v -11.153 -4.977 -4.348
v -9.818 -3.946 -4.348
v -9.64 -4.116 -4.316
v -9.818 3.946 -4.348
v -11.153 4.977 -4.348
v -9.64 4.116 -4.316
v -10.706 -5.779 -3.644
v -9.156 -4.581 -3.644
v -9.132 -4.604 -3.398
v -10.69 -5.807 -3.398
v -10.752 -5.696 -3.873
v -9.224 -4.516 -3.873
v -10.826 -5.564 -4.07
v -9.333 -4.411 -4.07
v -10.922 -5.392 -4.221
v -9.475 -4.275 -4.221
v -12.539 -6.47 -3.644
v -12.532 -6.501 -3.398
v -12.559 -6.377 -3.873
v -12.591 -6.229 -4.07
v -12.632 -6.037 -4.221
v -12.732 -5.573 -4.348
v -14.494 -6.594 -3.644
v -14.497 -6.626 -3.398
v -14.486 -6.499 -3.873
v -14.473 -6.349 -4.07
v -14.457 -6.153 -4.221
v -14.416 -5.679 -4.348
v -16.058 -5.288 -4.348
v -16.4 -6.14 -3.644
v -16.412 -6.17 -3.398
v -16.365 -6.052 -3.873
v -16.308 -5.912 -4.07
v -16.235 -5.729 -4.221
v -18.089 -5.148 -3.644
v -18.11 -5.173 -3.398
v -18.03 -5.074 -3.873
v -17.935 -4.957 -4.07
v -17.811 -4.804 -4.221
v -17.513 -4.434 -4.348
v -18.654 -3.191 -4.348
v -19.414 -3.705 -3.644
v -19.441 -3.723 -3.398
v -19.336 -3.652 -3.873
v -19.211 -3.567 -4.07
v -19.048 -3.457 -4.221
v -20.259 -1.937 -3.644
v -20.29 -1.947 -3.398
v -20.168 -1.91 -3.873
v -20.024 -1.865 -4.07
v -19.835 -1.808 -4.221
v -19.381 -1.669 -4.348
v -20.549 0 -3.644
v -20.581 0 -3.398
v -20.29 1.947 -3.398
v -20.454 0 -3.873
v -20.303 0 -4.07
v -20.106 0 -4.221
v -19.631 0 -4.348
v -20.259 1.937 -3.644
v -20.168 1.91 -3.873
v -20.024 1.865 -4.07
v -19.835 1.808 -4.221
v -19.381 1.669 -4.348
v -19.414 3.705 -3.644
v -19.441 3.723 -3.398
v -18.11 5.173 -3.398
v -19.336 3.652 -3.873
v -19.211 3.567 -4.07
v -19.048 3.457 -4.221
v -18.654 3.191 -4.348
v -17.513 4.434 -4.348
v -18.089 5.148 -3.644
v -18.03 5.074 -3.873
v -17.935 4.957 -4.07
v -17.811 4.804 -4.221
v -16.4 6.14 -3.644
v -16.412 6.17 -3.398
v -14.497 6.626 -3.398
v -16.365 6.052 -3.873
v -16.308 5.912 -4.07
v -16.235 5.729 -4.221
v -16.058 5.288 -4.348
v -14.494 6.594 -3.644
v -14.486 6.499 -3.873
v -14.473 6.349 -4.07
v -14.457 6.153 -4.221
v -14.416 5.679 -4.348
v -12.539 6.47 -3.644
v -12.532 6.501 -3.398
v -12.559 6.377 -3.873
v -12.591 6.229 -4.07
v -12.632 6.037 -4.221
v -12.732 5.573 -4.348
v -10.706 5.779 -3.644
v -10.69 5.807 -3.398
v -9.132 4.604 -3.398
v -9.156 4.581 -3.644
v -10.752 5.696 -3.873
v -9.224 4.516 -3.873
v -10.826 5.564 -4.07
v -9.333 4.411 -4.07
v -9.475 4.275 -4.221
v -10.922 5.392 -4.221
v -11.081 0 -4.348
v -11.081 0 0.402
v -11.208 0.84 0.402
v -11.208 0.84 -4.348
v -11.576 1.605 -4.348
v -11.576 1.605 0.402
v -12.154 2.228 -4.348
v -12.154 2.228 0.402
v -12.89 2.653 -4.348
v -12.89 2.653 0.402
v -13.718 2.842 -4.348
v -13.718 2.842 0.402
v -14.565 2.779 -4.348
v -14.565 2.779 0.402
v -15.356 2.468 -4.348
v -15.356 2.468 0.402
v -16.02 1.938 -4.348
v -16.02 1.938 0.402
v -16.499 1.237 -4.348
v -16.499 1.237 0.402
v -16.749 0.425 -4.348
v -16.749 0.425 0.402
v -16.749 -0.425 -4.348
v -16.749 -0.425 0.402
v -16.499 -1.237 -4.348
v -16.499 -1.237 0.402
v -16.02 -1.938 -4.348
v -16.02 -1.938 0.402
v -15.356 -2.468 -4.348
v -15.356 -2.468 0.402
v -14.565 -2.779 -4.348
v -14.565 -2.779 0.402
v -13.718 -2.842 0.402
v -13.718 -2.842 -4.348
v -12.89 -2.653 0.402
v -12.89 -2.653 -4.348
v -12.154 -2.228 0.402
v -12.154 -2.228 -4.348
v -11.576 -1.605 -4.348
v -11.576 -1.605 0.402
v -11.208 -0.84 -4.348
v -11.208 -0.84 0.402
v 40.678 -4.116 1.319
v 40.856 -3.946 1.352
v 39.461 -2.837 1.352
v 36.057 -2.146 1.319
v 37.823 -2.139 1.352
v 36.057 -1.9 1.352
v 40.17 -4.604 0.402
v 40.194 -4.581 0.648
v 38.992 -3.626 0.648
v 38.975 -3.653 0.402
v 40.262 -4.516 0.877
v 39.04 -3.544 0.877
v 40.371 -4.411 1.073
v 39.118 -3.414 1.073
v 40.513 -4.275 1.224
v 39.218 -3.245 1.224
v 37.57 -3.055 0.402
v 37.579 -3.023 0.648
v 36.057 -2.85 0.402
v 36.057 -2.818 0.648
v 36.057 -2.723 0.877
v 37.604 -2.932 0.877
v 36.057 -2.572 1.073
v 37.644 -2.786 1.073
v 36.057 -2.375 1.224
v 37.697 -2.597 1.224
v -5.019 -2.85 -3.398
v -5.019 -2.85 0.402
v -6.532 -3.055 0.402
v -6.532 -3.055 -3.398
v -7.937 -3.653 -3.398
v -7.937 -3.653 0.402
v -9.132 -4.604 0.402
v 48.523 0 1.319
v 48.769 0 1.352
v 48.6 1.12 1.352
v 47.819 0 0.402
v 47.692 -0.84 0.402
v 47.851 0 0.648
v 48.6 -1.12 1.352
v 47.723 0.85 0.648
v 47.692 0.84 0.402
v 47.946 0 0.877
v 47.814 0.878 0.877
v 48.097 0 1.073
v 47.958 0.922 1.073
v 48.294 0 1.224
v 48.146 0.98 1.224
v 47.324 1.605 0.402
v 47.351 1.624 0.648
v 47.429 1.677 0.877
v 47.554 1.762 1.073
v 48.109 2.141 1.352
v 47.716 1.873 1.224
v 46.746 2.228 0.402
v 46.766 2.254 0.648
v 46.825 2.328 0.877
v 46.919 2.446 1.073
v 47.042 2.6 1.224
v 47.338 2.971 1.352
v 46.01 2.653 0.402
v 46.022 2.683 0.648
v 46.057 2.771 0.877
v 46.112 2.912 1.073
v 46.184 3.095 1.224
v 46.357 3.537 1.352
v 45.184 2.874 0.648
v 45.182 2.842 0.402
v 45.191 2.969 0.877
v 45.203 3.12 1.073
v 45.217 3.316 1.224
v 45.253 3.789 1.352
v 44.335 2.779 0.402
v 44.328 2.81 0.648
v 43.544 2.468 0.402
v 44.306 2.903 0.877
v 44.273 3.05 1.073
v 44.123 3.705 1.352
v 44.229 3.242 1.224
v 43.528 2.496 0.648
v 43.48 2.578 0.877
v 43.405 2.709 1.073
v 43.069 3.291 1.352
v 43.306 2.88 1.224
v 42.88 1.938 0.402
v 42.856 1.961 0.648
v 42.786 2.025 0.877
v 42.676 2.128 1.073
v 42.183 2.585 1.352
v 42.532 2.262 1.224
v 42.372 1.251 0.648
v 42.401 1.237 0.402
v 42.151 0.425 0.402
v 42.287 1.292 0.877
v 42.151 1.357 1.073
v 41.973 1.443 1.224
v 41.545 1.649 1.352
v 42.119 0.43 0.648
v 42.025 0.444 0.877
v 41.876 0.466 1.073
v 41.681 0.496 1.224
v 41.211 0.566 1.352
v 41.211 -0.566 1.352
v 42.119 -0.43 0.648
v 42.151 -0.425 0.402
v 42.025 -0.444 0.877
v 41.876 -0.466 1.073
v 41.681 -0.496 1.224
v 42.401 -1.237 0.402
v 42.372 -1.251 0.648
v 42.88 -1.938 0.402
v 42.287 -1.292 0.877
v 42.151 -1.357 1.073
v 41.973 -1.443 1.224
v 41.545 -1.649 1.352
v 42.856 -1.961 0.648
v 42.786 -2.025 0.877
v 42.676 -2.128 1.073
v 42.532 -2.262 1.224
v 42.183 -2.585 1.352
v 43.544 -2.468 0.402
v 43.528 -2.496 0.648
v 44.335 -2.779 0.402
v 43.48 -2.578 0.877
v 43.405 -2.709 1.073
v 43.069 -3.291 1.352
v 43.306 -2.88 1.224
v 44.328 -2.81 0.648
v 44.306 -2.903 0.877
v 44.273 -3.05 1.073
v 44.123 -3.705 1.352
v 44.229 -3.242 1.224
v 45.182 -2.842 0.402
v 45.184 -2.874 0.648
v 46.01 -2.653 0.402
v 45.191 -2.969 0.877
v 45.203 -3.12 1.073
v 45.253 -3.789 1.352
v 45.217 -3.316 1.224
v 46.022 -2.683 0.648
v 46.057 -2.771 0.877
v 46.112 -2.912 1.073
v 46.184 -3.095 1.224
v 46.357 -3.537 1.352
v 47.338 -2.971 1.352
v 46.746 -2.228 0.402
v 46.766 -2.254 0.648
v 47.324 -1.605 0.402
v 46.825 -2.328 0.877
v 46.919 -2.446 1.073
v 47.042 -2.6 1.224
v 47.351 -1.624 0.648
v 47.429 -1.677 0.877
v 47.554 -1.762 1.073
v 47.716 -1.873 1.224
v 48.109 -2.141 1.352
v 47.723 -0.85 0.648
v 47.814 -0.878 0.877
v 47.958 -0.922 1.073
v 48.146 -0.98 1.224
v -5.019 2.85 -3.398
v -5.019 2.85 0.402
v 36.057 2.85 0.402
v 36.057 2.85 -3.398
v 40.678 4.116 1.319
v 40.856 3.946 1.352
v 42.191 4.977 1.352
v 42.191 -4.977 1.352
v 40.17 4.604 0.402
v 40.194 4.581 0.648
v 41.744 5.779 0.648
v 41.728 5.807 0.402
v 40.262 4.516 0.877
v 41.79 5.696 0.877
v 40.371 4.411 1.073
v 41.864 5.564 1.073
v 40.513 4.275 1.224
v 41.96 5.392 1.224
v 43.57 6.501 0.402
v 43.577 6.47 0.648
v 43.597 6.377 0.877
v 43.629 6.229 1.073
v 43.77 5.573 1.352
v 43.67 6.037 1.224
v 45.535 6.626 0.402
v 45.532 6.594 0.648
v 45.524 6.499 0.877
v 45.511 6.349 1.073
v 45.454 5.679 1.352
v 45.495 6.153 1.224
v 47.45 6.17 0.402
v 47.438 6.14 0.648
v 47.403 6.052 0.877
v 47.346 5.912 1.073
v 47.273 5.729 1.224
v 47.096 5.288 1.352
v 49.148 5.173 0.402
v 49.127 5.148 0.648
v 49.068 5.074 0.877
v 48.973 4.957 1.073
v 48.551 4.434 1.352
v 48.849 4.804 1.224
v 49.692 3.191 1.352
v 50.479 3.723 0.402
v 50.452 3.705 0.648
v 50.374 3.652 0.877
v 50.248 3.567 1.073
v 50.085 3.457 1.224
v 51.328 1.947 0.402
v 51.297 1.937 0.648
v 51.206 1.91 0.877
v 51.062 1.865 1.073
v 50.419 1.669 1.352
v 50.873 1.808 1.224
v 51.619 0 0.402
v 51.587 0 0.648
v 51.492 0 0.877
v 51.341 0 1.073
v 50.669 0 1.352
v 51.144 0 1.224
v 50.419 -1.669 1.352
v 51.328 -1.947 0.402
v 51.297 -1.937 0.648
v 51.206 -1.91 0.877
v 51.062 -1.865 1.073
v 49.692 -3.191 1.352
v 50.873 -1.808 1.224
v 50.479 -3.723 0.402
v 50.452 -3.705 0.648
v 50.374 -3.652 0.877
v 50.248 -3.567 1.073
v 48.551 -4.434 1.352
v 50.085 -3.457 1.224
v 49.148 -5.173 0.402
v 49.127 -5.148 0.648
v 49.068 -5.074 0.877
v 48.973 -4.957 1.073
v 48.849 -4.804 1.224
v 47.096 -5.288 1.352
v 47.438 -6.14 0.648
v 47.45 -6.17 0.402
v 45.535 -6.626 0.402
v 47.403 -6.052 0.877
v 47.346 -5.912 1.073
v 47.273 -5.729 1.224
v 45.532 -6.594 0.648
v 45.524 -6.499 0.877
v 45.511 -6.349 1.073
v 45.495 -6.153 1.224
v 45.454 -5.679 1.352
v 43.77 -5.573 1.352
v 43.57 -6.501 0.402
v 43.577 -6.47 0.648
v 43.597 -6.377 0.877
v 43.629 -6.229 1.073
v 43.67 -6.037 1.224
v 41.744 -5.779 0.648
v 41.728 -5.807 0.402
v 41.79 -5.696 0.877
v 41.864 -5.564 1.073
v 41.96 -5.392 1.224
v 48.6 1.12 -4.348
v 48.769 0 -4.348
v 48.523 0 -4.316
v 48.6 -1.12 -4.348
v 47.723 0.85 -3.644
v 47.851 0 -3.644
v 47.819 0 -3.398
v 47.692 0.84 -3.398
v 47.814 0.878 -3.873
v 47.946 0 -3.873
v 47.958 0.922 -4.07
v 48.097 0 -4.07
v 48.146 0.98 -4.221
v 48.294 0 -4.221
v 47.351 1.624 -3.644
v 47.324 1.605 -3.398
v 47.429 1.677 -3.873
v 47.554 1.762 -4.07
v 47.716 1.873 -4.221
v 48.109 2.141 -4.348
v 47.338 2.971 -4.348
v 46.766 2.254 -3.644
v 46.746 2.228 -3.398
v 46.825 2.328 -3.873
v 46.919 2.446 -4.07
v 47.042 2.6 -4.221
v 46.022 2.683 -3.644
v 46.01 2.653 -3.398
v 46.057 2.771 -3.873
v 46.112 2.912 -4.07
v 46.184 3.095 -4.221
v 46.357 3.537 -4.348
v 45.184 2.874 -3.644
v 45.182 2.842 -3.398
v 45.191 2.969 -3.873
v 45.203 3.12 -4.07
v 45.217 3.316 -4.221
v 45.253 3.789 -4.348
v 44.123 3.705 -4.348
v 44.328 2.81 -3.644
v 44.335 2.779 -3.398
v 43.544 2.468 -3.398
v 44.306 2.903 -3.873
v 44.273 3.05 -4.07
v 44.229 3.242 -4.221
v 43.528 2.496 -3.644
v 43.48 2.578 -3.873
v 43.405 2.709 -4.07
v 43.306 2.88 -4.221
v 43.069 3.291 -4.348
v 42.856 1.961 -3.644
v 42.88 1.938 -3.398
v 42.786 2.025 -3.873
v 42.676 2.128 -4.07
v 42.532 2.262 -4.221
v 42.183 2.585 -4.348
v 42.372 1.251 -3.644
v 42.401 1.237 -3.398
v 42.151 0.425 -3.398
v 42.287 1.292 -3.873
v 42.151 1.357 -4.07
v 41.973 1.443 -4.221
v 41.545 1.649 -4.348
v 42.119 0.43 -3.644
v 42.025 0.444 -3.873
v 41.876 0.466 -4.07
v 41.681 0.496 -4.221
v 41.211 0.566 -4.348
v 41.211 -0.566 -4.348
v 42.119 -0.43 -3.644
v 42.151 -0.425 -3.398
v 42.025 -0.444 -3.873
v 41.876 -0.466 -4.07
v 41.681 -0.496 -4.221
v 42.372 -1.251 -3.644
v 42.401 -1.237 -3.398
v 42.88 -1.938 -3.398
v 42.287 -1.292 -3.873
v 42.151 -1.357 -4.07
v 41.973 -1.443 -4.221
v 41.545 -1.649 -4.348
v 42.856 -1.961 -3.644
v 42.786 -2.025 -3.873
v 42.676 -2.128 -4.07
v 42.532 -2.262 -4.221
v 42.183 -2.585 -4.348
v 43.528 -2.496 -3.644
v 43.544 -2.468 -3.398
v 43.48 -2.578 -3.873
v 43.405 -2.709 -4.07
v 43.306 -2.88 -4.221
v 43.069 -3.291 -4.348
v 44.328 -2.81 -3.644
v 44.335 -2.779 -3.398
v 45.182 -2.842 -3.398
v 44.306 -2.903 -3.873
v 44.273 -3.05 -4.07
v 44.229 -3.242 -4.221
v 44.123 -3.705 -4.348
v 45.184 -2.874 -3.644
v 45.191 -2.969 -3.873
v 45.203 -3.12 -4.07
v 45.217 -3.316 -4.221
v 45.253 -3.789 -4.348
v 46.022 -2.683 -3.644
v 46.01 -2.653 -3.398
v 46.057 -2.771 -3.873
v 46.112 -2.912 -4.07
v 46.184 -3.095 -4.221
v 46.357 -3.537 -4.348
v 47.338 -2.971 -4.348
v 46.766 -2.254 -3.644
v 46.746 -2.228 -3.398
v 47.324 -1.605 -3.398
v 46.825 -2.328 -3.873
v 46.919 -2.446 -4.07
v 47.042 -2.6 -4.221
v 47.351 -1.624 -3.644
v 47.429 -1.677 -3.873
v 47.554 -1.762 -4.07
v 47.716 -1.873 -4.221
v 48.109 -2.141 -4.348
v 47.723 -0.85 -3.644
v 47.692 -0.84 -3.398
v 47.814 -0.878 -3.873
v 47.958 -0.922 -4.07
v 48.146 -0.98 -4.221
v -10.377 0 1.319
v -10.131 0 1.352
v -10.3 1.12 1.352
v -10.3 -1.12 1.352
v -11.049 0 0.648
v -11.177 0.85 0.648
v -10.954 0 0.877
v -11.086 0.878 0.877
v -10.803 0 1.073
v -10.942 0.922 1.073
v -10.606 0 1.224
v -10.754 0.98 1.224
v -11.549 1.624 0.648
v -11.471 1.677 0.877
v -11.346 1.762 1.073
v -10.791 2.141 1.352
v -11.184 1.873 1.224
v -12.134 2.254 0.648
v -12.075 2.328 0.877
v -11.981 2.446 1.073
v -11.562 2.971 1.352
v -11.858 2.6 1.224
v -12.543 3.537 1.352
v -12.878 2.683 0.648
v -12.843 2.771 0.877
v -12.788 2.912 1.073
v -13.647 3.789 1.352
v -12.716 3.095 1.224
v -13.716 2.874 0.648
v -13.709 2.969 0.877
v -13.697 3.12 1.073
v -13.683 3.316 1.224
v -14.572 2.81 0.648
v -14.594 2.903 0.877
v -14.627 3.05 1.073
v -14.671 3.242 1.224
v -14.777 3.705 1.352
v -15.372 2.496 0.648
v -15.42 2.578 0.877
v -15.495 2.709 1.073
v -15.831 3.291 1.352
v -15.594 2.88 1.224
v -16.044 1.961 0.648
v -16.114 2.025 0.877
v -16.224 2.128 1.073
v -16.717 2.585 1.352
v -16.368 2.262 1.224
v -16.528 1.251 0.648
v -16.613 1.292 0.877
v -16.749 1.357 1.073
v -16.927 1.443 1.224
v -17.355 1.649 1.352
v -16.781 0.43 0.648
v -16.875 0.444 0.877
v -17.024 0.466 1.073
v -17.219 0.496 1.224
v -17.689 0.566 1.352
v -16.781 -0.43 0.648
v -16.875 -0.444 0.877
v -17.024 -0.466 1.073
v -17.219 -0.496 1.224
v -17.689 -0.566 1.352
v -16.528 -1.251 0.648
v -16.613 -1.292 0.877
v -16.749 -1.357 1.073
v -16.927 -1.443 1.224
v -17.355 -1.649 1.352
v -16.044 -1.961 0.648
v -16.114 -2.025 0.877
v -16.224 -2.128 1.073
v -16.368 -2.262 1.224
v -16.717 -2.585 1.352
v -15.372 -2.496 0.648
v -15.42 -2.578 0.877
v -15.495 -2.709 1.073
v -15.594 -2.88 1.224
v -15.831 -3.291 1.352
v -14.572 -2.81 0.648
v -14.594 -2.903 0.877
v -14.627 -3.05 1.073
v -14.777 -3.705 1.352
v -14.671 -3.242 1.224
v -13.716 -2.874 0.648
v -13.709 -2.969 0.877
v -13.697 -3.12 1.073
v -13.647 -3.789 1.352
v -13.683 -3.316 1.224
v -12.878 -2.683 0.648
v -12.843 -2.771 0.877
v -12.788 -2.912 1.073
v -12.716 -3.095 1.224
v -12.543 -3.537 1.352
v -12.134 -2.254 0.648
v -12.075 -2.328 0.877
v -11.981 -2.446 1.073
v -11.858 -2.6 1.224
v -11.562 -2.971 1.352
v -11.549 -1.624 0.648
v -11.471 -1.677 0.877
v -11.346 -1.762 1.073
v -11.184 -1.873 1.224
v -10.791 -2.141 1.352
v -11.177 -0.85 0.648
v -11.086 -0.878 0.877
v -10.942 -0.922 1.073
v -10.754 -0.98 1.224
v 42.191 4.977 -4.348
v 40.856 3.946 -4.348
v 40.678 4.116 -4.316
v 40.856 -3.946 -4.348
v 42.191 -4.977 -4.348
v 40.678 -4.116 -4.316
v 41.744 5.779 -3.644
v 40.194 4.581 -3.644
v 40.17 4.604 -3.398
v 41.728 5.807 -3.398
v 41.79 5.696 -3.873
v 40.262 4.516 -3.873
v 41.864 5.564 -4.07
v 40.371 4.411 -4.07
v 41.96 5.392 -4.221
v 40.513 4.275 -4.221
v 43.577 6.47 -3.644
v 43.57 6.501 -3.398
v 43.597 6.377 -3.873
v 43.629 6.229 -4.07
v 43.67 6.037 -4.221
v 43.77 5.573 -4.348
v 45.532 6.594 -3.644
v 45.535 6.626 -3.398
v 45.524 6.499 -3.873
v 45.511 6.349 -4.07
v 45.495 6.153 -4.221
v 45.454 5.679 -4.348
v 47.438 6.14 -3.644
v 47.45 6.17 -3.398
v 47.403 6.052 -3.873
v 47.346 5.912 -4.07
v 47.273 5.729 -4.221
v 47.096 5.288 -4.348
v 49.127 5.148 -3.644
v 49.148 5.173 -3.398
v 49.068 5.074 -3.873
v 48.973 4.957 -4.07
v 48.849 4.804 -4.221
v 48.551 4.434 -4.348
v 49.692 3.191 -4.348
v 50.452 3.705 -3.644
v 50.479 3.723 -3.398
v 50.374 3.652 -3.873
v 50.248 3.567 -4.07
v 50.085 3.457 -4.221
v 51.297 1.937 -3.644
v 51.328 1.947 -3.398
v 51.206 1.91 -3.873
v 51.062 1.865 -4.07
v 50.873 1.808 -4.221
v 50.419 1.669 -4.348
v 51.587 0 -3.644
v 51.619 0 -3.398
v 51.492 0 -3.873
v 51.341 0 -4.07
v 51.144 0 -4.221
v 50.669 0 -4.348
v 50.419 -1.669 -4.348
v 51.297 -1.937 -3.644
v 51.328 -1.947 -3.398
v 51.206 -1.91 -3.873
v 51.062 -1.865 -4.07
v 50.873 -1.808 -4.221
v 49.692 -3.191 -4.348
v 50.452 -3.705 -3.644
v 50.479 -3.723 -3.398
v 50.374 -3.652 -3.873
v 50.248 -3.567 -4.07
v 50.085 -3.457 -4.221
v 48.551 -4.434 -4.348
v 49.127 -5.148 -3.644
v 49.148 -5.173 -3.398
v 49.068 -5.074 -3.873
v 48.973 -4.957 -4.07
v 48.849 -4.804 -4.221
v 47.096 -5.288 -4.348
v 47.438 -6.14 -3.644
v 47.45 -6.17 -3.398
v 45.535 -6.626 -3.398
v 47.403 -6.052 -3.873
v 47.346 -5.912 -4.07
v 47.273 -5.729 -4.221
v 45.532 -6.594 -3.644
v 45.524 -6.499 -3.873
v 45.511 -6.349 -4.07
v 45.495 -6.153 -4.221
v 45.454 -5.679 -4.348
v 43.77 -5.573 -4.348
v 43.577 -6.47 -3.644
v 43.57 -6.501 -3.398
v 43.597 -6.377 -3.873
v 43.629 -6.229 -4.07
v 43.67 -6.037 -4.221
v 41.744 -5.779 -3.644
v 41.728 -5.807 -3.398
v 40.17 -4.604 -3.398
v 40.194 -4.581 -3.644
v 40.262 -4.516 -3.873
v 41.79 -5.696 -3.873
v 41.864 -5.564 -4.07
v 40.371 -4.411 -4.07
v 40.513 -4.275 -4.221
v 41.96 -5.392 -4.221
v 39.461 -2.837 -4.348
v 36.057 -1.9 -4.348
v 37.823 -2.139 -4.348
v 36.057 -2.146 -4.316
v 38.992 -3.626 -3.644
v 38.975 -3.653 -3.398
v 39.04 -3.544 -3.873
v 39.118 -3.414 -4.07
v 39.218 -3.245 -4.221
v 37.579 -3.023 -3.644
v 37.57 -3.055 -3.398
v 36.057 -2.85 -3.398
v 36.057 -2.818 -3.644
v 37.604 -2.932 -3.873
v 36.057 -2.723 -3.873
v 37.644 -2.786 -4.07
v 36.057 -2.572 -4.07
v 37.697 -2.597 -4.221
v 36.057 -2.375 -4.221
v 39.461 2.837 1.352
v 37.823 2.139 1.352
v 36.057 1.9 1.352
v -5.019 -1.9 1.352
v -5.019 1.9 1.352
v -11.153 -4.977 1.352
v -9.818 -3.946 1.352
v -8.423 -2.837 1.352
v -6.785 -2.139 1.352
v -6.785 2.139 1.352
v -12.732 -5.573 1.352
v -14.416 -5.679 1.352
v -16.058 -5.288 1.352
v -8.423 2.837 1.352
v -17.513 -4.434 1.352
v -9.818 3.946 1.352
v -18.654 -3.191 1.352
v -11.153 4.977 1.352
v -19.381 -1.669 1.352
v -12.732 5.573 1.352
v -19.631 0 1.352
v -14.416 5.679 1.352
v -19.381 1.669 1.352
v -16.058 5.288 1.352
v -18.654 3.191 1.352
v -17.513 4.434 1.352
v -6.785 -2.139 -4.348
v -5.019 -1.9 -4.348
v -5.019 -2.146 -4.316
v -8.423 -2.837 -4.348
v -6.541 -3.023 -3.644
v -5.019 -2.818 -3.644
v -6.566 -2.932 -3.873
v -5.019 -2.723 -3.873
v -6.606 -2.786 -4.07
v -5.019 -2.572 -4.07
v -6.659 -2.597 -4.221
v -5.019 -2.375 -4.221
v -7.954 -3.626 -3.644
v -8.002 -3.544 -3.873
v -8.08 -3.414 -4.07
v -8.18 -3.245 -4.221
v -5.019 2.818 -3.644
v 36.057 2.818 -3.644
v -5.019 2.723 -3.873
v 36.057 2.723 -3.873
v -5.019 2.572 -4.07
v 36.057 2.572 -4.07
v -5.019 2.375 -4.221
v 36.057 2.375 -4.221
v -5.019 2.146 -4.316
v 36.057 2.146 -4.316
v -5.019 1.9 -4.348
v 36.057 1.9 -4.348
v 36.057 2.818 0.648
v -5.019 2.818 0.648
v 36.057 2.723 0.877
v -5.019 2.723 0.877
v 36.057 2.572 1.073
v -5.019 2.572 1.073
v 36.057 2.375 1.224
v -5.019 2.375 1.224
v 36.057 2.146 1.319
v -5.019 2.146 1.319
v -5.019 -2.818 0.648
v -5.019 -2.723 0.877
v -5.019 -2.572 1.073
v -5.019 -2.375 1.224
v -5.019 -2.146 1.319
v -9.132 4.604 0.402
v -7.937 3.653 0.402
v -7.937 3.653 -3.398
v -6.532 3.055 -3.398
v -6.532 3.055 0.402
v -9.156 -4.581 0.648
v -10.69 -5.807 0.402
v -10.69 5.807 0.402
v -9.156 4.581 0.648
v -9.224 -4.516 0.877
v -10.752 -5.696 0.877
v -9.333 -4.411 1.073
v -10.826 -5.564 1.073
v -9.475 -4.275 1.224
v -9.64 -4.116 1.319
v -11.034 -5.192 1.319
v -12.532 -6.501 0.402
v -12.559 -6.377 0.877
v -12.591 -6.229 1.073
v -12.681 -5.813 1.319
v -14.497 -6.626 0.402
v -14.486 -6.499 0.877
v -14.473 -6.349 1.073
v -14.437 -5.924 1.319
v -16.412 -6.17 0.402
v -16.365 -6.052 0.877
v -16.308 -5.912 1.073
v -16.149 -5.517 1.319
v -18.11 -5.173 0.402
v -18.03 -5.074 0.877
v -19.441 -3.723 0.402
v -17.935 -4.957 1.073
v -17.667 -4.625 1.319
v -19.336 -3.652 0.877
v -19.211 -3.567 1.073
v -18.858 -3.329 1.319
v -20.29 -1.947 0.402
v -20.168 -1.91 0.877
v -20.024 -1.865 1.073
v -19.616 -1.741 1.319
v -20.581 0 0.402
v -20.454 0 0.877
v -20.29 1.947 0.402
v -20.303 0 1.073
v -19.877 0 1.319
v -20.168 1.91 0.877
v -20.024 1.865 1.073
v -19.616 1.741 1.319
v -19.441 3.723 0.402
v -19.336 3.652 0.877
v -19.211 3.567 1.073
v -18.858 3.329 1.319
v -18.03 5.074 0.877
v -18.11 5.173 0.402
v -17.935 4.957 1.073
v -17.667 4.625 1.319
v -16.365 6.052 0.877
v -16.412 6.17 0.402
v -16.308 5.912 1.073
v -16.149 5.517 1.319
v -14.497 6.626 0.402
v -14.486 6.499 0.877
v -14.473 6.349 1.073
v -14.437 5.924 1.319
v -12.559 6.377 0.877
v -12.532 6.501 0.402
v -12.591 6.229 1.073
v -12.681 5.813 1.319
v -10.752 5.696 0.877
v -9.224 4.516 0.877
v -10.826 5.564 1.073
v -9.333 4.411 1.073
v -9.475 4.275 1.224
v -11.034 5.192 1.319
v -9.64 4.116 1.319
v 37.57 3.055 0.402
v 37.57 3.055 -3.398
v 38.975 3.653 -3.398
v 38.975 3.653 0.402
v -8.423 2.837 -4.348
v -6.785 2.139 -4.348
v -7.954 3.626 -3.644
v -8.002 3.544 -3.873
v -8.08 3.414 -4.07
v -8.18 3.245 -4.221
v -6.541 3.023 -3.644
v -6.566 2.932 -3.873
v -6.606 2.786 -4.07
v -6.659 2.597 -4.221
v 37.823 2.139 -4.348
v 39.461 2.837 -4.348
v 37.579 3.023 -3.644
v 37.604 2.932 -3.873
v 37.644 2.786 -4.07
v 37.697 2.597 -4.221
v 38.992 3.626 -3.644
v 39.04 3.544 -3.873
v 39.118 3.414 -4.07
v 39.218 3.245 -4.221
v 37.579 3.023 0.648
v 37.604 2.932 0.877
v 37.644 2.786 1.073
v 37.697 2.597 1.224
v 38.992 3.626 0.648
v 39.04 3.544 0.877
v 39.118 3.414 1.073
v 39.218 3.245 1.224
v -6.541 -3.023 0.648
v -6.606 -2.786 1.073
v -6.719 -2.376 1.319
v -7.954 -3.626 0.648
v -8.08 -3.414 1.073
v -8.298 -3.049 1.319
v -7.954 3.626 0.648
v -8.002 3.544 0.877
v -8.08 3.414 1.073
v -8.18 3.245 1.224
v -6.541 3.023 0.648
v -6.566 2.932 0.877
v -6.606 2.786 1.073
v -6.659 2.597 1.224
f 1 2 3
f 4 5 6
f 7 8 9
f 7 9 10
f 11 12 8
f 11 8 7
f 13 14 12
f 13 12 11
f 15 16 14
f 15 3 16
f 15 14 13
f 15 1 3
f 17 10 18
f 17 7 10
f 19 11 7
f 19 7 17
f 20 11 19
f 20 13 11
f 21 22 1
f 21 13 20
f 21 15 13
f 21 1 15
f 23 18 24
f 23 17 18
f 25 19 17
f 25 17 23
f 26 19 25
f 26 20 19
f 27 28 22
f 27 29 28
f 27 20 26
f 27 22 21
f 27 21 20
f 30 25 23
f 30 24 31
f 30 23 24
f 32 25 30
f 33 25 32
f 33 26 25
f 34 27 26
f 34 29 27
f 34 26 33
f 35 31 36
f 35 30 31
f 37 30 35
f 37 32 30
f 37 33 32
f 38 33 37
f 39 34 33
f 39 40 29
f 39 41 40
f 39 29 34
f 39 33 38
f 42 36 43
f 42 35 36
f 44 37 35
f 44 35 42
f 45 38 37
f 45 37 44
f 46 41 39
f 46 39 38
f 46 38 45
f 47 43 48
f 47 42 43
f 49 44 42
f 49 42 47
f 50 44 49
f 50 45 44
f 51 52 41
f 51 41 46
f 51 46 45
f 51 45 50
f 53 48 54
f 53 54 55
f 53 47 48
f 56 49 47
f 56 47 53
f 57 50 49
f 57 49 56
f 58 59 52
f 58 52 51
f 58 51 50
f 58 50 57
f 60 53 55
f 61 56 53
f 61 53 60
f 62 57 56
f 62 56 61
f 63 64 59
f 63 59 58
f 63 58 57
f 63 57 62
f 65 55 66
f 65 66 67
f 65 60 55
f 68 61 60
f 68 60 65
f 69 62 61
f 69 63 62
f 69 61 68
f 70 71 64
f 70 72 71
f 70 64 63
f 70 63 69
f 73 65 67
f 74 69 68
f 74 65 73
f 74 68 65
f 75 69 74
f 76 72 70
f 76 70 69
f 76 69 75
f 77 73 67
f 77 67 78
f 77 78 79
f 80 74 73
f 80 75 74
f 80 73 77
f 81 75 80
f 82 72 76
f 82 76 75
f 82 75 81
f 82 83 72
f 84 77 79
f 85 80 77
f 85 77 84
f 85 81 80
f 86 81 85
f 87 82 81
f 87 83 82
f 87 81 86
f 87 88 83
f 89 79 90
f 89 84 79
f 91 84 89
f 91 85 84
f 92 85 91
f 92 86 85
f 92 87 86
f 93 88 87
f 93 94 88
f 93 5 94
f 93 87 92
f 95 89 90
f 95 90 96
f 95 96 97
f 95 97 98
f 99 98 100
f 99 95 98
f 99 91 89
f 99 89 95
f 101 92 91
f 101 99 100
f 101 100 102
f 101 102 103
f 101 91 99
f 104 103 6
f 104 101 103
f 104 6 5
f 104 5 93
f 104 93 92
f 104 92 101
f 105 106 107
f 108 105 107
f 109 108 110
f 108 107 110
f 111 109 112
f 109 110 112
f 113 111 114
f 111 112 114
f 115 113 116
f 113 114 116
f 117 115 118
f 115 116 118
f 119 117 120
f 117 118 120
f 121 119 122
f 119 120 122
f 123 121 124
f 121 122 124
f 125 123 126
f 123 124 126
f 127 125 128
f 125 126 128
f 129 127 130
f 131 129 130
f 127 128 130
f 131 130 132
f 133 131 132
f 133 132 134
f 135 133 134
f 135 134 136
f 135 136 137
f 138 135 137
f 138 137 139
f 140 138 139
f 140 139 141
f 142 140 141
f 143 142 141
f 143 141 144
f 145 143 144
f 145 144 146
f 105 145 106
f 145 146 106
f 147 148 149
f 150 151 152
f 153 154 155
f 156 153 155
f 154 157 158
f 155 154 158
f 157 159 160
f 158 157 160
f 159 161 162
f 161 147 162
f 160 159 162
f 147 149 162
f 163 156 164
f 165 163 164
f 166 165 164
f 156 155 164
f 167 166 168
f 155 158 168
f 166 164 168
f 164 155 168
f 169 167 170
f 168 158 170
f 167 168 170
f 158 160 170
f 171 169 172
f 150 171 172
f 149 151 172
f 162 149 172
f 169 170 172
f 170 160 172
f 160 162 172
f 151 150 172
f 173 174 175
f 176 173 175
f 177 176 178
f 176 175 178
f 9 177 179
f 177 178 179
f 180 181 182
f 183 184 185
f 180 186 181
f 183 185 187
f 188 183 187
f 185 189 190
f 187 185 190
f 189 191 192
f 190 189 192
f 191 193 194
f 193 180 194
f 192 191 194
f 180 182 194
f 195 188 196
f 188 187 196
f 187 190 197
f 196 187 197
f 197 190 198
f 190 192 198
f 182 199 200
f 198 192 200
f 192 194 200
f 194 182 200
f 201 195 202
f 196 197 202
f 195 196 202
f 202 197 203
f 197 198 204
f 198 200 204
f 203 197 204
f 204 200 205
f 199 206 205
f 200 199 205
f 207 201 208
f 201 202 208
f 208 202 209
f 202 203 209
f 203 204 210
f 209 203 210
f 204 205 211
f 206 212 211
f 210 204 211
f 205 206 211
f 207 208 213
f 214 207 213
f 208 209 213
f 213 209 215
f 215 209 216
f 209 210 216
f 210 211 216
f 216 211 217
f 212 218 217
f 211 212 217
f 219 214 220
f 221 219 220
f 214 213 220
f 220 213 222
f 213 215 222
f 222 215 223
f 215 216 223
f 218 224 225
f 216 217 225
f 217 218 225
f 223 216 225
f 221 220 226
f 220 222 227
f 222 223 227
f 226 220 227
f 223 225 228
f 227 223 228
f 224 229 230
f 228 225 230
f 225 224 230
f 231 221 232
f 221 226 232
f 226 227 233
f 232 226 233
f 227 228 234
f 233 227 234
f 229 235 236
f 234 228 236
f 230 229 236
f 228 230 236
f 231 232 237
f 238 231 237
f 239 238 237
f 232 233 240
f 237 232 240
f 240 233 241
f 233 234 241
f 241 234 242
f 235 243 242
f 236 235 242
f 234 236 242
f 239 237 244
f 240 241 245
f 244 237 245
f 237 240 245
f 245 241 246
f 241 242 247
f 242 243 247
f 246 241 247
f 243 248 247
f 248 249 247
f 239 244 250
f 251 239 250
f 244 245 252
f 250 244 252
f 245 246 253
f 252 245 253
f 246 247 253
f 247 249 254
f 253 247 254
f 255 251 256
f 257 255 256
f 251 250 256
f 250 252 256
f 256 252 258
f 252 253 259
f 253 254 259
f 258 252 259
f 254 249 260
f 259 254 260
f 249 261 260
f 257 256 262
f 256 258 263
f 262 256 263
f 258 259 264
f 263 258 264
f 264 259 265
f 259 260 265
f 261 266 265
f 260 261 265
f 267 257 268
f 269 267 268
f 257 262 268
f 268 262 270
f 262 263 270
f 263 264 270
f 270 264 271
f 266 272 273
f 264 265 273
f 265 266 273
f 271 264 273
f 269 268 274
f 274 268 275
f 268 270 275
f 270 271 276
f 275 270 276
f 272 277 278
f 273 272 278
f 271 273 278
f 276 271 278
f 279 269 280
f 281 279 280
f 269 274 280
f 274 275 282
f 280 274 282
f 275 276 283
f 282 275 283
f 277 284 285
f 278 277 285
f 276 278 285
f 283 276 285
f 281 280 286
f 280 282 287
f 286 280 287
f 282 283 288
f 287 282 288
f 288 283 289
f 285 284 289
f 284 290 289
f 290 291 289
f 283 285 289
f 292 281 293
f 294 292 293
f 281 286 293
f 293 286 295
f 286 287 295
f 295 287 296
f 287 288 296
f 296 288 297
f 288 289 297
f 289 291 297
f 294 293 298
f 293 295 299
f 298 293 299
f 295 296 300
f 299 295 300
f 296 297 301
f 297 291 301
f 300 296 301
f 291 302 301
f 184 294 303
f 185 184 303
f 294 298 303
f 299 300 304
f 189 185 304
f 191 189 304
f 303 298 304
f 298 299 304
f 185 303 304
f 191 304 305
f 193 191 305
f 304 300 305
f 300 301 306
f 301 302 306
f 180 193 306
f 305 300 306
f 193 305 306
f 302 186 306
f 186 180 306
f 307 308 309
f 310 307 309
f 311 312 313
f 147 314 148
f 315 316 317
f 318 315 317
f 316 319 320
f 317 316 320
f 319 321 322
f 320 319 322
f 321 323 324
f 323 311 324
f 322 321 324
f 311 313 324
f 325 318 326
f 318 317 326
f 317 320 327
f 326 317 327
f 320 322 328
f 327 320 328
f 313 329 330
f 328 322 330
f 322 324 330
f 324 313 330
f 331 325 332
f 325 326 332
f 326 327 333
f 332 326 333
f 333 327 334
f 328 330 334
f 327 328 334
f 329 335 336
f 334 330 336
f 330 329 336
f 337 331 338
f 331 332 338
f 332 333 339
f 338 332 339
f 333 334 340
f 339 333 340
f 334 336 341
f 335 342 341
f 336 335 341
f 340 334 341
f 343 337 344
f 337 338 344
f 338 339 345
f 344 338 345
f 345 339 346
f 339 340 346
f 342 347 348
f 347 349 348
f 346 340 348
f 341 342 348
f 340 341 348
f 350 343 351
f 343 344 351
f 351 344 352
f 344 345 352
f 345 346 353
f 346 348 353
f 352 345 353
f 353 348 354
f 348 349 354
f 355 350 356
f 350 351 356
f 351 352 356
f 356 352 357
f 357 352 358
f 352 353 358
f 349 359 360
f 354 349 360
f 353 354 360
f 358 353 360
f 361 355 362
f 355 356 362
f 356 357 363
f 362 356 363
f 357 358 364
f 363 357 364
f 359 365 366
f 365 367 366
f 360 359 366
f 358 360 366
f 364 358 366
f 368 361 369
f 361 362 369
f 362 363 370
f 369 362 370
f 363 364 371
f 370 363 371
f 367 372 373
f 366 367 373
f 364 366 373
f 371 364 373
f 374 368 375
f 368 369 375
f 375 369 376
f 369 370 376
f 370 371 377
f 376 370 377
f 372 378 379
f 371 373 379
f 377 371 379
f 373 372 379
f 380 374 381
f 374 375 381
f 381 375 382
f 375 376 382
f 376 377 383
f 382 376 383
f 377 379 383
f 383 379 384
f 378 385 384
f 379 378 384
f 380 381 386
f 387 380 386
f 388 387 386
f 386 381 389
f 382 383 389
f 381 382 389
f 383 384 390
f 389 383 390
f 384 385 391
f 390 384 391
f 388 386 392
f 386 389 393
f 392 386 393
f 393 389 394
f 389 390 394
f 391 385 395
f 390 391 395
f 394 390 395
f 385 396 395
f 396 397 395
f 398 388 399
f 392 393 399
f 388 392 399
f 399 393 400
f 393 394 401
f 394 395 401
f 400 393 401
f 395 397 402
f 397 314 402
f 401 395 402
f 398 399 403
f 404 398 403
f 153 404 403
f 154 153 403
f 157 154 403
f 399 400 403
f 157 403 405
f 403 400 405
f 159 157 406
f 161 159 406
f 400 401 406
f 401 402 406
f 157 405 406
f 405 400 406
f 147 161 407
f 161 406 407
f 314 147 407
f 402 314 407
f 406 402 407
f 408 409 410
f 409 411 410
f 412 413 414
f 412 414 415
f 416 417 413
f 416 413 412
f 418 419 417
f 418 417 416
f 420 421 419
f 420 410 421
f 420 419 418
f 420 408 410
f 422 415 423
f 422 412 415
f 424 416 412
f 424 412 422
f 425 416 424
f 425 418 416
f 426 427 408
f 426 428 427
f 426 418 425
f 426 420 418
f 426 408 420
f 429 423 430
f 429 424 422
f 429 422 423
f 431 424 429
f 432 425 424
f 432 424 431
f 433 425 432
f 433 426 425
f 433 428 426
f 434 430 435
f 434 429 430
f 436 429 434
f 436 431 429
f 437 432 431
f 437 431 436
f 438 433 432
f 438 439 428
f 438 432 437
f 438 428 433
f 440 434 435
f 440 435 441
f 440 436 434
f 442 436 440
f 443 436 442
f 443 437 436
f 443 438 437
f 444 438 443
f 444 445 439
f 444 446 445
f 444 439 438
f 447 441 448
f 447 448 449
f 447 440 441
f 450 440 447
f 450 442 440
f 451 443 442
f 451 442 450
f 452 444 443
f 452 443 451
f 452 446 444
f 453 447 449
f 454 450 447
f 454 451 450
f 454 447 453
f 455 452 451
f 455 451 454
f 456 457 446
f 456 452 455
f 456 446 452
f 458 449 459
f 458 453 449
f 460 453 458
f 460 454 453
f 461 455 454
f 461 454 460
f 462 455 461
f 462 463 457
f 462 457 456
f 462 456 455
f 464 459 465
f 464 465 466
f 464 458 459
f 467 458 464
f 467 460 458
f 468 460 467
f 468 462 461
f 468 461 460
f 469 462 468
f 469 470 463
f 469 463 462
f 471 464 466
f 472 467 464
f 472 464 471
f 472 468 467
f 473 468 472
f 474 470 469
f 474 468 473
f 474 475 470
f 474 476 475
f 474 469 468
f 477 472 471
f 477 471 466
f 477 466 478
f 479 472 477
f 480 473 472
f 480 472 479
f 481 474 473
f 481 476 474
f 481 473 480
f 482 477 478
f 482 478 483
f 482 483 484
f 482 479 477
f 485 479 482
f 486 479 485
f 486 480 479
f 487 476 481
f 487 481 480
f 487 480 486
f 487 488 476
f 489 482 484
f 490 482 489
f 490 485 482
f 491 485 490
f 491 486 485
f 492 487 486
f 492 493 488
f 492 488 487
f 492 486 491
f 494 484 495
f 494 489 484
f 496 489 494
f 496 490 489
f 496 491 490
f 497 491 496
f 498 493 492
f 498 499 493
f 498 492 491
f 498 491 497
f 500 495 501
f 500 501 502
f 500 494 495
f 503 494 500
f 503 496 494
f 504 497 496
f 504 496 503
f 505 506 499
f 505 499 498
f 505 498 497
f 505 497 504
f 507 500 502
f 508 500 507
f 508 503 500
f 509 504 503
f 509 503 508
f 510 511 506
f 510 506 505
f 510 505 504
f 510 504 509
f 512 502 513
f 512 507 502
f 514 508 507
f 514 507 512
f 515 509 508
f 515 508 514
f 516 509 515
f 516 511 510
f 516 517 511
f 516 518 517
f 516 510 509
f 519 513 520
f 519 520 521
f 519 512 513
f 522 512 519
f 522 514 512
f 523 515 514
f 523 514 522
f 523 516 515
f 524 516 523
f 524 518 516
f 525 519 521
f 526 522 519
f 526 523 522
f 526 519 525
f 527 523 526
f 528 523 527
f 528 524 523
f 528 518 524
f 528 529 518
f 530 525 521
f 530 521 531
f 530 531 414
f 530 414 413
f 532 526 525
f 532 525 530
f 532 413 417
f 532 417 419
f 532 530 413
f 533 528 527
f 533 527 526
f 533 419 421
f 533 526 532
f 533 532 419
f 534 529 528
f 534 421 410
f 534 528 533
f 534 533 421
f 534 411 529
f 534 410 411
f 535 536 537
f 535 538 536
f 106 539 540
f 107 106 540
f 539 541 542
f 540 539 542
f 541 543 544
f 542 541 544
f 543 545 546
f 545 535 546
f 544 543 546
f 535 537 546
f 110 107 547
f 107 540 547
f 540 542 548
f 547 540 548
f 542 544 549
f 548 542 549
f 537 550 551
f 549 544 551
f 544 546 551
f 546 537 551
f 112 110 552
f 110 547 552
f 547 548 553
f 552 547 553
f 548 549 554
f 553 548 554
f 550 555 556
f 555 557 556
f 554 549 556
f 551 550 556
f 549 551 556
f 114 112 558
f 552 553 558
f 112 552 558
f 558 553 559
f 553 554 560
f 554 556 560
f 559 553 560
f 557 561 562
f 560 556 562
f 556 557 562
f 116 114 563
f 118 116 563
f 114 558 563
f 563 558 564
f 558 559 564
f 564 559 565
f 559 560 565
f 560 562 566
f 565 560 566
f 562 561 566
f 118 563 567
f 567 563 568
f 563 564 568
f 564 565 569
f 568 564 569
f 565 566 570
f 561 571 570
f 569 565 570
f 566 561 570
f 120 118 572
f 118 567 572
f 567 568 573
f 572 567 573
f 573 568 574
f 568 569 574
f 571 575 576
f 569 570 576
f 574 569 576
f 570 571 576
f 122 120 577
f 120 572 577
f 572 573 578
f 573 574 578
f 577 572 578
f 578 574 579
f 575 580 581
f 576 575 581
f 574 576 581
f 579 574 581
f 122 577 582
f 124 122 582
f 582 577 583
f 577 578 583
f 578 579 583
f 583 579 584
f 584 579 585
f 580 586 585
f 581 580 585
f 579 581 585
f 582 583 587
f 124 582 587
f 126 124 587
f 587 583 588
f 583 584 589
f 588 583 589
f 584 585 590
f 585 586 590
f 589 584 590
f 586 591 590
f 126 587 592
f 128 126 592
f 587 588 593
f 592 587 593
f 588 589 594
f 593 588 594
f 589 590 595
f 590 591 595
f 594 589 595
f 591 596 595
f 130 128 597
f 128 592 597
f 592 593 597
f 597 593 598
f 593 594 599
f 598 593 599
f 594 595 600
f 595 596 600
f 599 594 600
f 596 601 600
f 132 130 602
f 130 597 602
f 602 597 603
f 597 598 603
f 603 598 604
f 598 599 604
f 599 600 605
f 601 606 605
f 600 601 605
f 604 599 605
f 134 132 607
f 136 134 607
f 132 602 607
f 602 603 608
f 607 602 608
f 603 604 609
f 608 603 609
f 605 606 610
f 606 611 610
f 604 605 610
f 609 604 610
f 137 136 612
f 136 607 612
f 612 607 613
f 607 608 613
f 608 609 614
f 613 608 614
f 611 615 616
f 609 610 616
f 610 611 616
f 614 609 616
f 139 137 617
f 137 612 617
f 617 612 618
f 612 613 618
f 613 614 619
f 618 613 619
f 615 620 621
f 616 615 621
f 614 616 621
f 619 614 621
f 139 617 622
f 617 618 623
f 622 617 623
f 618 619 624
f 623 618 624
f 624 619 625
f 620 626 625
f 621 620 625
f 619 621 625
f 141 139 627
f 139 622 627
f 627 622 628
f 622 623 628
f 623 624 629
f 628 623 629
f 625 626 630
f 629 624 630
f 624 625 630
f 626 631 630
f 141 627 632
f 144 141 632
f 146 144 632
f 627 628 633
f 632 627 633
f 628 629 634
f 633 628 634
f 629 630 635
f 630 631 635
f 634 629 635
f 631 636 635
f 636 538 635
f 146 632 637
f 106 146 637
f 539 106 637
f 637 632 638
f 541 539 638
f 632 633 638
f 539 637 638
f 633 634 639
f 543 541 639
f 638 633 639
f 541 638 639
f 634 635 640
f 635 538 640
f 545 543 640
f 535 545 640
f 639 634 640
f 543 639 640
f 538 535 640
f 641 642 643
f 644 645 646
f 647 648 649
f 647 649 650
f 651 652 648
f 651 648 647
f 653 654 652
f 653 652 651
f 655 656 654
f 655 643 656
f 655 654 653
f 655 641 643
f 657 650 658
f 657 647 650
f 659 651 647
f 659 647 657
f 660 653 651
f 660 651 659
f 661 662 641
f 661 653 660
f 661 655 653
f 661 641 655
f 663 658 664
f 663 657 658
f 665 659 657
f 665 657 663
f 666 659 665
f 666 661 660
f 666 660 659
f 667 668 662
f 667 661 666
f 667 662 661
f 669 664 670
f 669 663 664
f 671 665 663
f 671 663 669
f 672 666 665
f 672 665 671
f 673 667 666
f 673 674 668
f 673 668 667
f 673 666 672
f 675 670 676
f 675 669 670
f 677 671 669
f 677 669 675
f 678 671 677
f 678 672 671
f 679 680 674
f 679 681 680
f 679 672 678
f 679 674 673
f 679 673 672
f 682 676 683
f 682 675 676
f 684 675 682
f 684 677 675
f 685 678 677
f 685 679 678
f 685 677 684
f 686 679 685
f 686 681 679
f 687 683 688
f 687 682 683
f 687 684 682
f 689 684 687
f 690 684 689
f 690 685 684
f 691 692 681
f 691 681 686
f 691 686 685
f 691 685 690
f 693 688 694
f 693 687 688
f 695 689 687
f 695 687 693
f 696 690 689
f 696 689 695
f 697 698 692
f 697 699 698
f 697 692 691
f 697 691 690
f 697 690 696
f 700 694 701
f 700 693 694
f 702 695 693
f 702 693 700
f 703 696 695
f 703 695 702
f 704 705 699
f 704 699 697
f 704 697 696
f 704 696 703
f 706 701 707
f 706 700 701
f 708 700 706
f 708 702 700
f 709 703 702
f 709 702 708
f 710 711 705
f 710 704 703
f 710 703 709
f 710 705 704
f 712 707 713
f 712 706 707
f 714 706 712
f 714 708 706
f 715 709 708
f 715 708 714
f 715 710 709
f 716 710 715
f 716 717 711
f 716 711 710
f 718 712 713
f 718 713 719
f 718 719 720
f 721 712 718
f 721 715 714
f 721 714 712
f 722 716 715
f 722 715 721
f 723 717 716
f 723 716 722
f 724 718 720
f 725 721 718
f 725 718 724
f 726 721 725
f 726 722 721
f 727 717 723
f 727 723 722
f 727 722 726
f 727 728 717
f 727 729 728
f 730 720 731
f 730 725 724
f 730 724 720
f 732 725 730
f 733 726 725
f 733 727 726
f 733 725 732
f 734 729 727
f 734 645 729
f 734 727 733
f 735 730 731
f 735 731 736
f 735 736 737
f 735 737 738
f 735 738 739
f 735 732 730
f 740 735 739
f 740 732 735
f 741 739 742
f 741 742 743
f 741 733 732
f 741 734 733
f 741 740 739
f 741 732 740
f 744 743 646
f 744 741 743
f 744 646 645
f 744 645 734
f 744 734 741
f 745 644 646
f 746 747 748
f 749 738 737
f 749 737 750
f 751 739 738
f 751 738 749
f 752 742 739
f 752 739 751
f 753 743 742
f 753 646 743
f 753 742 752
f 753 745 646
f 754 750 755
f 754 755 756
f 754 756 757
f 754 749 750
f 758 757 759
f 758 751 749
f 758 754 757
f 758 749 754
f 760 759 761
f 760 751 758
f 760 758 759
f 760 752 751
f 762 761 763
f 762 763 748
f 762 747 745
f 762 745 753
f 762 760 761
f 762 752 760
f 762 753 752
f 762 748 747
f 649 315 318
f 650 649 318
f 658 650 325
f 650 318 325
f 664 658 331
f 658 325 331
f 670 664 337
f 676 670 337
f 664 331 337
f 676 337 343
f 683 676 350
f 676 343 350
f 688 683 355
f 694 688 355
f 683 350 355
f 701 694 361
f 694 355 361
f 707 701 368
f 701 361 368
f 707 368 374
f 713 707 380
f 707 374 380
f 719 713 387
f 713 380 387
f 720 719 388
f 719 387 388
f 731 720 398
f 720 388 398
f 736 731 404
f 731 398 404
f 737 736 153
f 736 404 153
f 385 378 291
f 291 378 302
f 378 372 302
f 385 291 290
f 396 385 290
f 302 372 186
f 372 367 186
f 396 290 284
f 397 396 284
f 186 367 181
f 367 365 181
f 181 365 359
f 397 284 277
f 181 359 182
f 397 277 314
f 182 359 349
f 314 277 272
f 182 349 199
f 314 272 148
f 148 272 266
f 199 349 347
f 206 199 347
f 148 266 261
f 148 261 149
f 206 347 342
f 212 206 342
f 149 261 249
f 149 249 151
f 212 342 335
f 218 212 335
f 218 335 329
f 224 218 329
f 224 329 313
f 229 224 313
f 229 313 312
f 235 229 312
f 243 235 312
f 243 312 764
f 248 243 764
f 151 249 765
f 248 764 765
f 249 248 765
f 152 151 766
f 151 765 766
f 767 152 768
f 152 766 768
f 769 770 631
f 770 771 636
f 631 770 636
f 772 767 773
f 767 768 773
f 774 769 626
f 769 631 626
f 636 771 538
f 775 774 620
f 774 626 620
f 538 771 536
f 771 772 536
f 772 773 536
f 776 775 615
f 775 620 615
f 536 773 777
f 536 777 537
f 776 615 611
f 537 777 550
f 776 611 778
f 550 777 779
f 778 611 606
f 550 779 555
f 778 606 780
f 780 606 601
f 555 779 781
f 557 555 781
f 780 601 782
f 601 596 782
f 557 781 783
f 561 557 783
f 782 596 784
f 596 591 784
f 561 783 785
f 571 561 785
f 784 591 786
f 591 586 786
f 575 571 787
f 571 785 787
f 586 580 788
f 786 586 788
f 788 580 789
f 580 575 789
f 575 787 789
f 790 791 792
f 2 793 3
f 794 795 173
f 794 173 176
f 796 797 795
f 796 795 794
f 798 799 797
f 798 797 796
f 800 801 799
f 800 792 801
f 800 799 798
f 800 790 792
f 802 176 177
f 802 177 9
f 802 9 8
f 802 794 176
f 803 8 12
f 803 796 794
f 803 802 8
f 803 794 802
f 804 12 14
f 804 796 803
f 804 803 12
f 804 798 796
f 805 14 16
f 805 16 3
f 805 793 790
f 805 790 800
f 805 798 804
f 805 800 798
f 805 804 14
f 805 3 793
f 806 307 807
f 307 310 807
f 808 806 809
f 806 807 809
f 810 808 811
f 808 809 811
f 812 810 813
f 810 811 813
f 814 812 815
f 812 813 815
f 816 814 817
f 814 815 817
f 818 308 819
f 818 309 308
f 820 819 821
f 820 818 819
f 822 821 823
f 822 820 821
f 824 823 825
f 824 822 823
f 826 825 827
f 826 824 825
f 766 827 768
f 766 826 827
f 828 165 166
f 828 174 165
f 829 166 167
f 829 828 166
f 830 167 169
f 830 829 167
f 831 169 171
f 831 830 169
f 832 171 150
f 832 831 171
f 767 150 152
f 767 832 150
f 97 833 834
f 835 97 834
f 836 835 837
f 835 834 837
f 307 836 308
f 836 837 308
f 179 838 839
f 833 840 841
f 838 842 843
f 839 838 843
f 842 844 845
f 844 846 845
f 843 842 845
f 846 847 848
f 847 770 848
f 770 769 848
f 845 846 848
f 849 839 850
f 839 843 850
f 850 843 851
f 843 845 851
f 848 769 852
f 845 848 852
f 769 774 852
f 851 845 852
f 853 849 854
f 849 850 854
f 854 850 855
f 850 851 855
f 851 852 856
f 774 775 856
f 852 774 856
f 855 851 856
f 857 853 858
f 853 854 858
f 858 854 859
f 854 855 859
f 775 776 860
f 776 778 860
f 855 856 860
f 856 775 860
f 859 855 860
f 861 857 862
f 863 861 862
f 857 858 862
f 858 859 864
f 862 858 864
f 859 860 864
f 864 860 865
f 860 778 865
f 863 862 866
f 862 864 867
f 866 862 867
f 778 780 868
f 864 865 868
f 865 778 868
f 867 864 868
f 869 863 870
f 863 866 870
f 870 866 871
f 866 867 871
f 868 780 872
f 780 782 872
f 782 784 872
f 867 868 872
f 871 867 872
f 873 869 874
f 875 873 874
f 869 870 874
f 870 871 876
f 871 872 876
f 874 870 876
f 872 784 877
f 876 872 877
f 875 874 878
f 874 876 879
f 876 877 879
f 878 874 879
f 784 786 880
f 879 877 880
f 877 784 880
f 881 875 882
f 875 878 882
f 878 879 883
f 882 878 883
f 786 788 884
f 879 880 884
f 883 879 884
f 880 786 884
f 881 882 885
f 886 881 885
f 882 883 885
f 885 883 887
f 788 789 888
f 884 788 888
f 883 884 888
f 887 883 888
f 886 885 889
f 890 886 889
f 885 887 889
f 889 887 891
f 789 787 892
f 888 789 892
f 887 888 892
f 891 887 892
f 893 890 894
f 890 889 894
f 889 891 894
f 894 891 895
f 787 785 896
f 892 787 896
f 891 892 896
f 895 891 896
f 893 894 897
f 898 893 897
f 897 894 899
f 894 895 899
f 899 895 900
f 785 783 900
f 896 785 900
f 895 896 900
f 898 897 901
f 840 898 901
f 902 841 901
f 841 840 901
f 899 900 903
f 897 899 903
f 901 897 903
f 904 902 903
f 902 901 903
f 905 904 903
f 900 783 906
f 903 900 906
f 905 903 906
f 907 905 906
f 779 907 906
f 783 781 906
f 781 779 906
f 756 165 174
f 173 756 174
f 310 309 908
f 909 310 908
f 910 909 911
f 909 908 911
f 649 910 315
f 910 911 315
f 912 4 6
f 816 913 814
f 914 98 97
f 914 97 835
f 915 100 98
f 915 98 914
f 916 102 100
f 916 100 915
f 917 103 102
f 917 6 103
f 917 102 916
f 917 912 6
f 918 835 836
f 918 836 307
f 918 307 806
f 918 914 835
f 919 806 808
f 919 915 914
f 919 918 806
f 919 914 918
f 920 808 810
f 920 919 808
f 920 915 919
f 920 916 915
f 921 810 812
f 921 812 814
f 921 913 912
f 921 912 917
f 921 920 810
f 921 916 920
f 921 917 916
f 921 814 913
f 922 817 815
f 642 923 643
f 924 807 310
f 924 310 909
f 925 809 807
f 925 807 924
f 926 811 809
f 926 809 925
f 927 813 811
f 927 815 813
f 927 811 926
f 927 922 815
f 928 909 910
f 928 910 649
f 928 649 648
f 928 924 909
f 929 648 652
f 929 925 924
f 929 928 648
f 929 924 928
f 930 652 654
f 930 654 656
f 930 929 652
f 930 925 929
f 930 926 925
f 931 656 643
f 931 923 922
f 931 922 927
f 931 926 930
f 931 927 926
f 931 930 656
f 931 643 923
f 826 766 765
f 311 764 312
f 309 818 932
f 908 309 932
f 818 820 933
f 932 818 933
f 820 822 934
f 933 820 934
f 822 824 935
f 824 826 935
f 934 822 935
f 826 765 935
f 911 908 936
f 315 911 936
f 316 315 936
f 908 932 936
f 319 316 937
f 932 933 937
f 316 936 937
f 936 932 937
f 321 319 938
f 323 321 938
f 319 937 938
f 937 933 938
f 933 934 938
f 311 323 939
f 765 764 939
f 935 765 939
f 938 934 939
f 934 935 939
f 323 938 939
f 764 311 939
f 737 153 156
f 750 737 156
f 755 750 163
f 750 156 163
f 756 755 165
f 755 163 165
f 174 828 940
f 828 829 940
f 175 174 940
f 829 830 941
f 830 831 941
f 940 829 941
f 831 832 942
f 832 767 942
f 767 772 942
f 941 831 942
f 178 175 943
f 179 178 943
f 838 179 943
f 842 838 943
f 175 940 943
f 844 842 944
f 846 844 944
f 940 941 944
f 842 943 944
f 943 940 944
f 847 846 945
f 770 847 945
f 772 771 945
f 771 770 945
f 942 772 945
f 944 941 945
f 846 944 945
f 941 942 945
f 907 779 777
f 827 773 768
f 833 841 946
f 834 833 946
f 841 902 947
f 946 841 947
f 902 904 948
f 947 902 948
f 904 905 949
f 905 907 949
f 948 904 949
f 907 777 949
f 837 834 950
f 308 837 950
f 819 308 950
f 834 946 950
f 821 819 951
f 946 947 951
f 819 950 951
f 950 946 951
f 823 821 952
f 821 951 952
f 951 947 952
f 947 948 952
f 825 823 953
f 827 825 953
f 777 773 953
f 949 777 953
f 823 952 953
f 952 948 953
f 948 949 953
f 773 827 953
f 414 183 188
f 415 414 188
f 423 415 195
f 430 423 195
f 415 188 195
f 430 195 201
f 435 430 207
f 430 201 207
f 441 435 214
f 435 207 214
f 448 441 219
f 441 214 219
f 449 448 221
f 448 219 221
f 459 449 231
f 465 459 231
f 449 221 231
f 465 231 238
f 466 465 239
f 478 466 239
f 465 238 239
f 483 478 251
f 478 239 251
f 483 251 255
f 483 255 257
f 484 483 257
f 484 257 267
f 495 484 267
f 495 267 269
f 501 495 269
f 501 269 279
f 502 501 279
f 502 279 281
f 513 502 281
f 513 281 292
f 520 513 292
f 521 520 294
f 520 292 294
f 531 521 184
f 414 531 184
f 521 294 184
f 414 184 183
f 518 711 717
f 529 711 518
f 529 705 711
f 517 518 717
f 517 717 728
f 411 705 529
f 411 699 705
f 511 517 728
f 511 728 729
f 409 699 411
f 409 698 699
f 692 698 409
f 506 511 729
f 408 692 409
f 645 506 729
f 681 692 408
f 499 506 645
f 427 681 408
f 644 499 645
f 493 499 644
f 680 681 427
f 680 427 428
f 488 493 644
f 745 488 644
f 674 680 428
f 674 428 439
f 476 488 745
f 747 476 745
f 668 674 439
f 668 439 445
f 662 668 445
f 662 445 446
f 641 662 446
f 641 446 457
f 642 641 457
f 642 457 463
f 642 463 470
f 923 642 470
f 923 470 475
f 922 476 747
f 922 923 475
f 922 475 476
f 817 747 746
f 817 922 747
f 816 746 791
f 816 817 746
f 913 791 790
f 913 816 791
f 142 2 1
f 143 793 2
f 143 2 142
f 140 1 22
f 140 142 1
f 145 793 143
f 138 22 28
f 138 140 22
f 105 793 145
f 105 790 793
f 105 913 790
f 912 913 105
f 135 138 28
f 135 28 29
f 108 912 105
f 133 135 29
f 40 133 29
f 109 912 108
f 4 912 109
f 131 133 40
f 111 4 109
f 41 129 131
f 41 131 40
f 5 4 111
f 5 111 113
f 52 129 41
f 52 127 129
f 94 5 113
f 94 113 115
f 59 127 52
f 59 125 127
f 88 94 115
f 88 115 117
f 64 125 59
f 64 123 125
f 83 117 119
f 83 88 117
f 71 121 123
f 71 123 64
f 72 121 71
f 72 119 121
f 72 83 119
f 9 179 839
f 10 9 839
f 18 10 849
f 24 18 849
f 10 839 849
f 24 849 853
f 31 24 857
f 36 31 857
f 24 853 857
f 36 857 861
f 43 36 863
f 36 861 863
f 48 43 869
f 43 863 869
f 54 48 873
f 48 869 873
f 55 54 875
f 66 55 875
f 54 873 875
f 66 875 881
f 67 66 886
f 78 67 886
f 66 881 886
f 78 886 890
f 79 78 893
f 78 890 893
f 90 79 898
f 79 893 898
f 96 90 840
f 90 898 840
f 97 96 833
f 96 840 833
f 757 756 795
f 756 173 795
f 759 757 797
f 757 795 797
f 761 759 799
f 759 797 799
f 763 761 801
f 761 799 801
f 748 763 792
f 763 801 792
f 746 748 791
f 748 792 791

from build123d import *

# Parameters (mm, degrees)
SKETCH1_R           = 1.5
BOSS_EXTRUDE1_DEPTH = 3
FILLET1_R           = 0.5
SCALE1_SCALE        = 1.9


with BuildPart() as part:
    # Sketch1 → Boss-Extrude1 (new body)
    with BuildSketch(Plane.XY):
        with BuildLine():
            Line((4.69041576, 1.5), (26.30958424, 1.5))
            ThreePointArc((26.30958424, 1.5), (27.486281051, 1.740401367), (28.474391514, 2.423076923))
            ThreePointArc((28.474391514, 2.423076923), (34.5, 0), (28.474391514, -2.423076923))
            ThreePointArc((28.474391514, -2.423076923), (27.486281051, -1.740401367), (26.30958424, -1.5))
            Line((26.30958424, -1.5), (4.69041576, -1.5))
            ThreePointArc((4.69041576, -1.5), (3.513718949, -1.740401367), (2.525608486, -2.423076923))
            ThreePointArc((2.525608486, -2.423076923), (-3.5, 0), (2.525608486, 2.423076923))
            ThreePointArc((2.525608486, 2.423076923), (3.513718949, 1.740401367), (4.69041576, 1.5))
        make_face()
        Circle(SKETCH1_R, mode=Mode.SUBTRACT)
        with Locations((31, 0)):
            Circle(SKETCH1_R, mode=Mode.SUBTRACT)
    extrude(amount=-BOSS_EXTRUDE1_DEPTH)

    # Fillet1
    fillet1_edges = [part.edges().sort_by_distance(p)[0] for p in [
        (-3.5, 0, 0),
        (3.513718949, 1.740401367, 0),
        (15.5, 1.5, 0),
        (27.486281051, 1.740401367, 0),
        (3.513718949, 1.740401367, -3),
        (-3.5, 0, -3),
        (3.513718949, -1.740401367, -3),
        (-1.5, 0, 0),
        (15.5, -1.5, -3),
        (29.5, 0, -3),
        (29.5, 0, 0),
        (27.486281051, -1.740401367, -3),
        (34.5, 0, -3),
        (27.486281051, 1.740401367, -3),
        (34.5, 0, 0),
        (15.5, 1.5, -3),
        (27.486281051, -1.740401367, 0),
        (15.5, -1.5, 0),
        (3.513718949, -1.740401367, 0),
    ]]
    fillet(fillet1_edges, radius=FILLET1_R)


with BuildPart() as part_1:
    # Scale1: scaled about (15.478903788, 0, -1.501893929)
    add(part.part.scale(SCALE1_SCALE).moved(Location((-13.931013409, 0, 1.351704536))))


solid = part_1.part
